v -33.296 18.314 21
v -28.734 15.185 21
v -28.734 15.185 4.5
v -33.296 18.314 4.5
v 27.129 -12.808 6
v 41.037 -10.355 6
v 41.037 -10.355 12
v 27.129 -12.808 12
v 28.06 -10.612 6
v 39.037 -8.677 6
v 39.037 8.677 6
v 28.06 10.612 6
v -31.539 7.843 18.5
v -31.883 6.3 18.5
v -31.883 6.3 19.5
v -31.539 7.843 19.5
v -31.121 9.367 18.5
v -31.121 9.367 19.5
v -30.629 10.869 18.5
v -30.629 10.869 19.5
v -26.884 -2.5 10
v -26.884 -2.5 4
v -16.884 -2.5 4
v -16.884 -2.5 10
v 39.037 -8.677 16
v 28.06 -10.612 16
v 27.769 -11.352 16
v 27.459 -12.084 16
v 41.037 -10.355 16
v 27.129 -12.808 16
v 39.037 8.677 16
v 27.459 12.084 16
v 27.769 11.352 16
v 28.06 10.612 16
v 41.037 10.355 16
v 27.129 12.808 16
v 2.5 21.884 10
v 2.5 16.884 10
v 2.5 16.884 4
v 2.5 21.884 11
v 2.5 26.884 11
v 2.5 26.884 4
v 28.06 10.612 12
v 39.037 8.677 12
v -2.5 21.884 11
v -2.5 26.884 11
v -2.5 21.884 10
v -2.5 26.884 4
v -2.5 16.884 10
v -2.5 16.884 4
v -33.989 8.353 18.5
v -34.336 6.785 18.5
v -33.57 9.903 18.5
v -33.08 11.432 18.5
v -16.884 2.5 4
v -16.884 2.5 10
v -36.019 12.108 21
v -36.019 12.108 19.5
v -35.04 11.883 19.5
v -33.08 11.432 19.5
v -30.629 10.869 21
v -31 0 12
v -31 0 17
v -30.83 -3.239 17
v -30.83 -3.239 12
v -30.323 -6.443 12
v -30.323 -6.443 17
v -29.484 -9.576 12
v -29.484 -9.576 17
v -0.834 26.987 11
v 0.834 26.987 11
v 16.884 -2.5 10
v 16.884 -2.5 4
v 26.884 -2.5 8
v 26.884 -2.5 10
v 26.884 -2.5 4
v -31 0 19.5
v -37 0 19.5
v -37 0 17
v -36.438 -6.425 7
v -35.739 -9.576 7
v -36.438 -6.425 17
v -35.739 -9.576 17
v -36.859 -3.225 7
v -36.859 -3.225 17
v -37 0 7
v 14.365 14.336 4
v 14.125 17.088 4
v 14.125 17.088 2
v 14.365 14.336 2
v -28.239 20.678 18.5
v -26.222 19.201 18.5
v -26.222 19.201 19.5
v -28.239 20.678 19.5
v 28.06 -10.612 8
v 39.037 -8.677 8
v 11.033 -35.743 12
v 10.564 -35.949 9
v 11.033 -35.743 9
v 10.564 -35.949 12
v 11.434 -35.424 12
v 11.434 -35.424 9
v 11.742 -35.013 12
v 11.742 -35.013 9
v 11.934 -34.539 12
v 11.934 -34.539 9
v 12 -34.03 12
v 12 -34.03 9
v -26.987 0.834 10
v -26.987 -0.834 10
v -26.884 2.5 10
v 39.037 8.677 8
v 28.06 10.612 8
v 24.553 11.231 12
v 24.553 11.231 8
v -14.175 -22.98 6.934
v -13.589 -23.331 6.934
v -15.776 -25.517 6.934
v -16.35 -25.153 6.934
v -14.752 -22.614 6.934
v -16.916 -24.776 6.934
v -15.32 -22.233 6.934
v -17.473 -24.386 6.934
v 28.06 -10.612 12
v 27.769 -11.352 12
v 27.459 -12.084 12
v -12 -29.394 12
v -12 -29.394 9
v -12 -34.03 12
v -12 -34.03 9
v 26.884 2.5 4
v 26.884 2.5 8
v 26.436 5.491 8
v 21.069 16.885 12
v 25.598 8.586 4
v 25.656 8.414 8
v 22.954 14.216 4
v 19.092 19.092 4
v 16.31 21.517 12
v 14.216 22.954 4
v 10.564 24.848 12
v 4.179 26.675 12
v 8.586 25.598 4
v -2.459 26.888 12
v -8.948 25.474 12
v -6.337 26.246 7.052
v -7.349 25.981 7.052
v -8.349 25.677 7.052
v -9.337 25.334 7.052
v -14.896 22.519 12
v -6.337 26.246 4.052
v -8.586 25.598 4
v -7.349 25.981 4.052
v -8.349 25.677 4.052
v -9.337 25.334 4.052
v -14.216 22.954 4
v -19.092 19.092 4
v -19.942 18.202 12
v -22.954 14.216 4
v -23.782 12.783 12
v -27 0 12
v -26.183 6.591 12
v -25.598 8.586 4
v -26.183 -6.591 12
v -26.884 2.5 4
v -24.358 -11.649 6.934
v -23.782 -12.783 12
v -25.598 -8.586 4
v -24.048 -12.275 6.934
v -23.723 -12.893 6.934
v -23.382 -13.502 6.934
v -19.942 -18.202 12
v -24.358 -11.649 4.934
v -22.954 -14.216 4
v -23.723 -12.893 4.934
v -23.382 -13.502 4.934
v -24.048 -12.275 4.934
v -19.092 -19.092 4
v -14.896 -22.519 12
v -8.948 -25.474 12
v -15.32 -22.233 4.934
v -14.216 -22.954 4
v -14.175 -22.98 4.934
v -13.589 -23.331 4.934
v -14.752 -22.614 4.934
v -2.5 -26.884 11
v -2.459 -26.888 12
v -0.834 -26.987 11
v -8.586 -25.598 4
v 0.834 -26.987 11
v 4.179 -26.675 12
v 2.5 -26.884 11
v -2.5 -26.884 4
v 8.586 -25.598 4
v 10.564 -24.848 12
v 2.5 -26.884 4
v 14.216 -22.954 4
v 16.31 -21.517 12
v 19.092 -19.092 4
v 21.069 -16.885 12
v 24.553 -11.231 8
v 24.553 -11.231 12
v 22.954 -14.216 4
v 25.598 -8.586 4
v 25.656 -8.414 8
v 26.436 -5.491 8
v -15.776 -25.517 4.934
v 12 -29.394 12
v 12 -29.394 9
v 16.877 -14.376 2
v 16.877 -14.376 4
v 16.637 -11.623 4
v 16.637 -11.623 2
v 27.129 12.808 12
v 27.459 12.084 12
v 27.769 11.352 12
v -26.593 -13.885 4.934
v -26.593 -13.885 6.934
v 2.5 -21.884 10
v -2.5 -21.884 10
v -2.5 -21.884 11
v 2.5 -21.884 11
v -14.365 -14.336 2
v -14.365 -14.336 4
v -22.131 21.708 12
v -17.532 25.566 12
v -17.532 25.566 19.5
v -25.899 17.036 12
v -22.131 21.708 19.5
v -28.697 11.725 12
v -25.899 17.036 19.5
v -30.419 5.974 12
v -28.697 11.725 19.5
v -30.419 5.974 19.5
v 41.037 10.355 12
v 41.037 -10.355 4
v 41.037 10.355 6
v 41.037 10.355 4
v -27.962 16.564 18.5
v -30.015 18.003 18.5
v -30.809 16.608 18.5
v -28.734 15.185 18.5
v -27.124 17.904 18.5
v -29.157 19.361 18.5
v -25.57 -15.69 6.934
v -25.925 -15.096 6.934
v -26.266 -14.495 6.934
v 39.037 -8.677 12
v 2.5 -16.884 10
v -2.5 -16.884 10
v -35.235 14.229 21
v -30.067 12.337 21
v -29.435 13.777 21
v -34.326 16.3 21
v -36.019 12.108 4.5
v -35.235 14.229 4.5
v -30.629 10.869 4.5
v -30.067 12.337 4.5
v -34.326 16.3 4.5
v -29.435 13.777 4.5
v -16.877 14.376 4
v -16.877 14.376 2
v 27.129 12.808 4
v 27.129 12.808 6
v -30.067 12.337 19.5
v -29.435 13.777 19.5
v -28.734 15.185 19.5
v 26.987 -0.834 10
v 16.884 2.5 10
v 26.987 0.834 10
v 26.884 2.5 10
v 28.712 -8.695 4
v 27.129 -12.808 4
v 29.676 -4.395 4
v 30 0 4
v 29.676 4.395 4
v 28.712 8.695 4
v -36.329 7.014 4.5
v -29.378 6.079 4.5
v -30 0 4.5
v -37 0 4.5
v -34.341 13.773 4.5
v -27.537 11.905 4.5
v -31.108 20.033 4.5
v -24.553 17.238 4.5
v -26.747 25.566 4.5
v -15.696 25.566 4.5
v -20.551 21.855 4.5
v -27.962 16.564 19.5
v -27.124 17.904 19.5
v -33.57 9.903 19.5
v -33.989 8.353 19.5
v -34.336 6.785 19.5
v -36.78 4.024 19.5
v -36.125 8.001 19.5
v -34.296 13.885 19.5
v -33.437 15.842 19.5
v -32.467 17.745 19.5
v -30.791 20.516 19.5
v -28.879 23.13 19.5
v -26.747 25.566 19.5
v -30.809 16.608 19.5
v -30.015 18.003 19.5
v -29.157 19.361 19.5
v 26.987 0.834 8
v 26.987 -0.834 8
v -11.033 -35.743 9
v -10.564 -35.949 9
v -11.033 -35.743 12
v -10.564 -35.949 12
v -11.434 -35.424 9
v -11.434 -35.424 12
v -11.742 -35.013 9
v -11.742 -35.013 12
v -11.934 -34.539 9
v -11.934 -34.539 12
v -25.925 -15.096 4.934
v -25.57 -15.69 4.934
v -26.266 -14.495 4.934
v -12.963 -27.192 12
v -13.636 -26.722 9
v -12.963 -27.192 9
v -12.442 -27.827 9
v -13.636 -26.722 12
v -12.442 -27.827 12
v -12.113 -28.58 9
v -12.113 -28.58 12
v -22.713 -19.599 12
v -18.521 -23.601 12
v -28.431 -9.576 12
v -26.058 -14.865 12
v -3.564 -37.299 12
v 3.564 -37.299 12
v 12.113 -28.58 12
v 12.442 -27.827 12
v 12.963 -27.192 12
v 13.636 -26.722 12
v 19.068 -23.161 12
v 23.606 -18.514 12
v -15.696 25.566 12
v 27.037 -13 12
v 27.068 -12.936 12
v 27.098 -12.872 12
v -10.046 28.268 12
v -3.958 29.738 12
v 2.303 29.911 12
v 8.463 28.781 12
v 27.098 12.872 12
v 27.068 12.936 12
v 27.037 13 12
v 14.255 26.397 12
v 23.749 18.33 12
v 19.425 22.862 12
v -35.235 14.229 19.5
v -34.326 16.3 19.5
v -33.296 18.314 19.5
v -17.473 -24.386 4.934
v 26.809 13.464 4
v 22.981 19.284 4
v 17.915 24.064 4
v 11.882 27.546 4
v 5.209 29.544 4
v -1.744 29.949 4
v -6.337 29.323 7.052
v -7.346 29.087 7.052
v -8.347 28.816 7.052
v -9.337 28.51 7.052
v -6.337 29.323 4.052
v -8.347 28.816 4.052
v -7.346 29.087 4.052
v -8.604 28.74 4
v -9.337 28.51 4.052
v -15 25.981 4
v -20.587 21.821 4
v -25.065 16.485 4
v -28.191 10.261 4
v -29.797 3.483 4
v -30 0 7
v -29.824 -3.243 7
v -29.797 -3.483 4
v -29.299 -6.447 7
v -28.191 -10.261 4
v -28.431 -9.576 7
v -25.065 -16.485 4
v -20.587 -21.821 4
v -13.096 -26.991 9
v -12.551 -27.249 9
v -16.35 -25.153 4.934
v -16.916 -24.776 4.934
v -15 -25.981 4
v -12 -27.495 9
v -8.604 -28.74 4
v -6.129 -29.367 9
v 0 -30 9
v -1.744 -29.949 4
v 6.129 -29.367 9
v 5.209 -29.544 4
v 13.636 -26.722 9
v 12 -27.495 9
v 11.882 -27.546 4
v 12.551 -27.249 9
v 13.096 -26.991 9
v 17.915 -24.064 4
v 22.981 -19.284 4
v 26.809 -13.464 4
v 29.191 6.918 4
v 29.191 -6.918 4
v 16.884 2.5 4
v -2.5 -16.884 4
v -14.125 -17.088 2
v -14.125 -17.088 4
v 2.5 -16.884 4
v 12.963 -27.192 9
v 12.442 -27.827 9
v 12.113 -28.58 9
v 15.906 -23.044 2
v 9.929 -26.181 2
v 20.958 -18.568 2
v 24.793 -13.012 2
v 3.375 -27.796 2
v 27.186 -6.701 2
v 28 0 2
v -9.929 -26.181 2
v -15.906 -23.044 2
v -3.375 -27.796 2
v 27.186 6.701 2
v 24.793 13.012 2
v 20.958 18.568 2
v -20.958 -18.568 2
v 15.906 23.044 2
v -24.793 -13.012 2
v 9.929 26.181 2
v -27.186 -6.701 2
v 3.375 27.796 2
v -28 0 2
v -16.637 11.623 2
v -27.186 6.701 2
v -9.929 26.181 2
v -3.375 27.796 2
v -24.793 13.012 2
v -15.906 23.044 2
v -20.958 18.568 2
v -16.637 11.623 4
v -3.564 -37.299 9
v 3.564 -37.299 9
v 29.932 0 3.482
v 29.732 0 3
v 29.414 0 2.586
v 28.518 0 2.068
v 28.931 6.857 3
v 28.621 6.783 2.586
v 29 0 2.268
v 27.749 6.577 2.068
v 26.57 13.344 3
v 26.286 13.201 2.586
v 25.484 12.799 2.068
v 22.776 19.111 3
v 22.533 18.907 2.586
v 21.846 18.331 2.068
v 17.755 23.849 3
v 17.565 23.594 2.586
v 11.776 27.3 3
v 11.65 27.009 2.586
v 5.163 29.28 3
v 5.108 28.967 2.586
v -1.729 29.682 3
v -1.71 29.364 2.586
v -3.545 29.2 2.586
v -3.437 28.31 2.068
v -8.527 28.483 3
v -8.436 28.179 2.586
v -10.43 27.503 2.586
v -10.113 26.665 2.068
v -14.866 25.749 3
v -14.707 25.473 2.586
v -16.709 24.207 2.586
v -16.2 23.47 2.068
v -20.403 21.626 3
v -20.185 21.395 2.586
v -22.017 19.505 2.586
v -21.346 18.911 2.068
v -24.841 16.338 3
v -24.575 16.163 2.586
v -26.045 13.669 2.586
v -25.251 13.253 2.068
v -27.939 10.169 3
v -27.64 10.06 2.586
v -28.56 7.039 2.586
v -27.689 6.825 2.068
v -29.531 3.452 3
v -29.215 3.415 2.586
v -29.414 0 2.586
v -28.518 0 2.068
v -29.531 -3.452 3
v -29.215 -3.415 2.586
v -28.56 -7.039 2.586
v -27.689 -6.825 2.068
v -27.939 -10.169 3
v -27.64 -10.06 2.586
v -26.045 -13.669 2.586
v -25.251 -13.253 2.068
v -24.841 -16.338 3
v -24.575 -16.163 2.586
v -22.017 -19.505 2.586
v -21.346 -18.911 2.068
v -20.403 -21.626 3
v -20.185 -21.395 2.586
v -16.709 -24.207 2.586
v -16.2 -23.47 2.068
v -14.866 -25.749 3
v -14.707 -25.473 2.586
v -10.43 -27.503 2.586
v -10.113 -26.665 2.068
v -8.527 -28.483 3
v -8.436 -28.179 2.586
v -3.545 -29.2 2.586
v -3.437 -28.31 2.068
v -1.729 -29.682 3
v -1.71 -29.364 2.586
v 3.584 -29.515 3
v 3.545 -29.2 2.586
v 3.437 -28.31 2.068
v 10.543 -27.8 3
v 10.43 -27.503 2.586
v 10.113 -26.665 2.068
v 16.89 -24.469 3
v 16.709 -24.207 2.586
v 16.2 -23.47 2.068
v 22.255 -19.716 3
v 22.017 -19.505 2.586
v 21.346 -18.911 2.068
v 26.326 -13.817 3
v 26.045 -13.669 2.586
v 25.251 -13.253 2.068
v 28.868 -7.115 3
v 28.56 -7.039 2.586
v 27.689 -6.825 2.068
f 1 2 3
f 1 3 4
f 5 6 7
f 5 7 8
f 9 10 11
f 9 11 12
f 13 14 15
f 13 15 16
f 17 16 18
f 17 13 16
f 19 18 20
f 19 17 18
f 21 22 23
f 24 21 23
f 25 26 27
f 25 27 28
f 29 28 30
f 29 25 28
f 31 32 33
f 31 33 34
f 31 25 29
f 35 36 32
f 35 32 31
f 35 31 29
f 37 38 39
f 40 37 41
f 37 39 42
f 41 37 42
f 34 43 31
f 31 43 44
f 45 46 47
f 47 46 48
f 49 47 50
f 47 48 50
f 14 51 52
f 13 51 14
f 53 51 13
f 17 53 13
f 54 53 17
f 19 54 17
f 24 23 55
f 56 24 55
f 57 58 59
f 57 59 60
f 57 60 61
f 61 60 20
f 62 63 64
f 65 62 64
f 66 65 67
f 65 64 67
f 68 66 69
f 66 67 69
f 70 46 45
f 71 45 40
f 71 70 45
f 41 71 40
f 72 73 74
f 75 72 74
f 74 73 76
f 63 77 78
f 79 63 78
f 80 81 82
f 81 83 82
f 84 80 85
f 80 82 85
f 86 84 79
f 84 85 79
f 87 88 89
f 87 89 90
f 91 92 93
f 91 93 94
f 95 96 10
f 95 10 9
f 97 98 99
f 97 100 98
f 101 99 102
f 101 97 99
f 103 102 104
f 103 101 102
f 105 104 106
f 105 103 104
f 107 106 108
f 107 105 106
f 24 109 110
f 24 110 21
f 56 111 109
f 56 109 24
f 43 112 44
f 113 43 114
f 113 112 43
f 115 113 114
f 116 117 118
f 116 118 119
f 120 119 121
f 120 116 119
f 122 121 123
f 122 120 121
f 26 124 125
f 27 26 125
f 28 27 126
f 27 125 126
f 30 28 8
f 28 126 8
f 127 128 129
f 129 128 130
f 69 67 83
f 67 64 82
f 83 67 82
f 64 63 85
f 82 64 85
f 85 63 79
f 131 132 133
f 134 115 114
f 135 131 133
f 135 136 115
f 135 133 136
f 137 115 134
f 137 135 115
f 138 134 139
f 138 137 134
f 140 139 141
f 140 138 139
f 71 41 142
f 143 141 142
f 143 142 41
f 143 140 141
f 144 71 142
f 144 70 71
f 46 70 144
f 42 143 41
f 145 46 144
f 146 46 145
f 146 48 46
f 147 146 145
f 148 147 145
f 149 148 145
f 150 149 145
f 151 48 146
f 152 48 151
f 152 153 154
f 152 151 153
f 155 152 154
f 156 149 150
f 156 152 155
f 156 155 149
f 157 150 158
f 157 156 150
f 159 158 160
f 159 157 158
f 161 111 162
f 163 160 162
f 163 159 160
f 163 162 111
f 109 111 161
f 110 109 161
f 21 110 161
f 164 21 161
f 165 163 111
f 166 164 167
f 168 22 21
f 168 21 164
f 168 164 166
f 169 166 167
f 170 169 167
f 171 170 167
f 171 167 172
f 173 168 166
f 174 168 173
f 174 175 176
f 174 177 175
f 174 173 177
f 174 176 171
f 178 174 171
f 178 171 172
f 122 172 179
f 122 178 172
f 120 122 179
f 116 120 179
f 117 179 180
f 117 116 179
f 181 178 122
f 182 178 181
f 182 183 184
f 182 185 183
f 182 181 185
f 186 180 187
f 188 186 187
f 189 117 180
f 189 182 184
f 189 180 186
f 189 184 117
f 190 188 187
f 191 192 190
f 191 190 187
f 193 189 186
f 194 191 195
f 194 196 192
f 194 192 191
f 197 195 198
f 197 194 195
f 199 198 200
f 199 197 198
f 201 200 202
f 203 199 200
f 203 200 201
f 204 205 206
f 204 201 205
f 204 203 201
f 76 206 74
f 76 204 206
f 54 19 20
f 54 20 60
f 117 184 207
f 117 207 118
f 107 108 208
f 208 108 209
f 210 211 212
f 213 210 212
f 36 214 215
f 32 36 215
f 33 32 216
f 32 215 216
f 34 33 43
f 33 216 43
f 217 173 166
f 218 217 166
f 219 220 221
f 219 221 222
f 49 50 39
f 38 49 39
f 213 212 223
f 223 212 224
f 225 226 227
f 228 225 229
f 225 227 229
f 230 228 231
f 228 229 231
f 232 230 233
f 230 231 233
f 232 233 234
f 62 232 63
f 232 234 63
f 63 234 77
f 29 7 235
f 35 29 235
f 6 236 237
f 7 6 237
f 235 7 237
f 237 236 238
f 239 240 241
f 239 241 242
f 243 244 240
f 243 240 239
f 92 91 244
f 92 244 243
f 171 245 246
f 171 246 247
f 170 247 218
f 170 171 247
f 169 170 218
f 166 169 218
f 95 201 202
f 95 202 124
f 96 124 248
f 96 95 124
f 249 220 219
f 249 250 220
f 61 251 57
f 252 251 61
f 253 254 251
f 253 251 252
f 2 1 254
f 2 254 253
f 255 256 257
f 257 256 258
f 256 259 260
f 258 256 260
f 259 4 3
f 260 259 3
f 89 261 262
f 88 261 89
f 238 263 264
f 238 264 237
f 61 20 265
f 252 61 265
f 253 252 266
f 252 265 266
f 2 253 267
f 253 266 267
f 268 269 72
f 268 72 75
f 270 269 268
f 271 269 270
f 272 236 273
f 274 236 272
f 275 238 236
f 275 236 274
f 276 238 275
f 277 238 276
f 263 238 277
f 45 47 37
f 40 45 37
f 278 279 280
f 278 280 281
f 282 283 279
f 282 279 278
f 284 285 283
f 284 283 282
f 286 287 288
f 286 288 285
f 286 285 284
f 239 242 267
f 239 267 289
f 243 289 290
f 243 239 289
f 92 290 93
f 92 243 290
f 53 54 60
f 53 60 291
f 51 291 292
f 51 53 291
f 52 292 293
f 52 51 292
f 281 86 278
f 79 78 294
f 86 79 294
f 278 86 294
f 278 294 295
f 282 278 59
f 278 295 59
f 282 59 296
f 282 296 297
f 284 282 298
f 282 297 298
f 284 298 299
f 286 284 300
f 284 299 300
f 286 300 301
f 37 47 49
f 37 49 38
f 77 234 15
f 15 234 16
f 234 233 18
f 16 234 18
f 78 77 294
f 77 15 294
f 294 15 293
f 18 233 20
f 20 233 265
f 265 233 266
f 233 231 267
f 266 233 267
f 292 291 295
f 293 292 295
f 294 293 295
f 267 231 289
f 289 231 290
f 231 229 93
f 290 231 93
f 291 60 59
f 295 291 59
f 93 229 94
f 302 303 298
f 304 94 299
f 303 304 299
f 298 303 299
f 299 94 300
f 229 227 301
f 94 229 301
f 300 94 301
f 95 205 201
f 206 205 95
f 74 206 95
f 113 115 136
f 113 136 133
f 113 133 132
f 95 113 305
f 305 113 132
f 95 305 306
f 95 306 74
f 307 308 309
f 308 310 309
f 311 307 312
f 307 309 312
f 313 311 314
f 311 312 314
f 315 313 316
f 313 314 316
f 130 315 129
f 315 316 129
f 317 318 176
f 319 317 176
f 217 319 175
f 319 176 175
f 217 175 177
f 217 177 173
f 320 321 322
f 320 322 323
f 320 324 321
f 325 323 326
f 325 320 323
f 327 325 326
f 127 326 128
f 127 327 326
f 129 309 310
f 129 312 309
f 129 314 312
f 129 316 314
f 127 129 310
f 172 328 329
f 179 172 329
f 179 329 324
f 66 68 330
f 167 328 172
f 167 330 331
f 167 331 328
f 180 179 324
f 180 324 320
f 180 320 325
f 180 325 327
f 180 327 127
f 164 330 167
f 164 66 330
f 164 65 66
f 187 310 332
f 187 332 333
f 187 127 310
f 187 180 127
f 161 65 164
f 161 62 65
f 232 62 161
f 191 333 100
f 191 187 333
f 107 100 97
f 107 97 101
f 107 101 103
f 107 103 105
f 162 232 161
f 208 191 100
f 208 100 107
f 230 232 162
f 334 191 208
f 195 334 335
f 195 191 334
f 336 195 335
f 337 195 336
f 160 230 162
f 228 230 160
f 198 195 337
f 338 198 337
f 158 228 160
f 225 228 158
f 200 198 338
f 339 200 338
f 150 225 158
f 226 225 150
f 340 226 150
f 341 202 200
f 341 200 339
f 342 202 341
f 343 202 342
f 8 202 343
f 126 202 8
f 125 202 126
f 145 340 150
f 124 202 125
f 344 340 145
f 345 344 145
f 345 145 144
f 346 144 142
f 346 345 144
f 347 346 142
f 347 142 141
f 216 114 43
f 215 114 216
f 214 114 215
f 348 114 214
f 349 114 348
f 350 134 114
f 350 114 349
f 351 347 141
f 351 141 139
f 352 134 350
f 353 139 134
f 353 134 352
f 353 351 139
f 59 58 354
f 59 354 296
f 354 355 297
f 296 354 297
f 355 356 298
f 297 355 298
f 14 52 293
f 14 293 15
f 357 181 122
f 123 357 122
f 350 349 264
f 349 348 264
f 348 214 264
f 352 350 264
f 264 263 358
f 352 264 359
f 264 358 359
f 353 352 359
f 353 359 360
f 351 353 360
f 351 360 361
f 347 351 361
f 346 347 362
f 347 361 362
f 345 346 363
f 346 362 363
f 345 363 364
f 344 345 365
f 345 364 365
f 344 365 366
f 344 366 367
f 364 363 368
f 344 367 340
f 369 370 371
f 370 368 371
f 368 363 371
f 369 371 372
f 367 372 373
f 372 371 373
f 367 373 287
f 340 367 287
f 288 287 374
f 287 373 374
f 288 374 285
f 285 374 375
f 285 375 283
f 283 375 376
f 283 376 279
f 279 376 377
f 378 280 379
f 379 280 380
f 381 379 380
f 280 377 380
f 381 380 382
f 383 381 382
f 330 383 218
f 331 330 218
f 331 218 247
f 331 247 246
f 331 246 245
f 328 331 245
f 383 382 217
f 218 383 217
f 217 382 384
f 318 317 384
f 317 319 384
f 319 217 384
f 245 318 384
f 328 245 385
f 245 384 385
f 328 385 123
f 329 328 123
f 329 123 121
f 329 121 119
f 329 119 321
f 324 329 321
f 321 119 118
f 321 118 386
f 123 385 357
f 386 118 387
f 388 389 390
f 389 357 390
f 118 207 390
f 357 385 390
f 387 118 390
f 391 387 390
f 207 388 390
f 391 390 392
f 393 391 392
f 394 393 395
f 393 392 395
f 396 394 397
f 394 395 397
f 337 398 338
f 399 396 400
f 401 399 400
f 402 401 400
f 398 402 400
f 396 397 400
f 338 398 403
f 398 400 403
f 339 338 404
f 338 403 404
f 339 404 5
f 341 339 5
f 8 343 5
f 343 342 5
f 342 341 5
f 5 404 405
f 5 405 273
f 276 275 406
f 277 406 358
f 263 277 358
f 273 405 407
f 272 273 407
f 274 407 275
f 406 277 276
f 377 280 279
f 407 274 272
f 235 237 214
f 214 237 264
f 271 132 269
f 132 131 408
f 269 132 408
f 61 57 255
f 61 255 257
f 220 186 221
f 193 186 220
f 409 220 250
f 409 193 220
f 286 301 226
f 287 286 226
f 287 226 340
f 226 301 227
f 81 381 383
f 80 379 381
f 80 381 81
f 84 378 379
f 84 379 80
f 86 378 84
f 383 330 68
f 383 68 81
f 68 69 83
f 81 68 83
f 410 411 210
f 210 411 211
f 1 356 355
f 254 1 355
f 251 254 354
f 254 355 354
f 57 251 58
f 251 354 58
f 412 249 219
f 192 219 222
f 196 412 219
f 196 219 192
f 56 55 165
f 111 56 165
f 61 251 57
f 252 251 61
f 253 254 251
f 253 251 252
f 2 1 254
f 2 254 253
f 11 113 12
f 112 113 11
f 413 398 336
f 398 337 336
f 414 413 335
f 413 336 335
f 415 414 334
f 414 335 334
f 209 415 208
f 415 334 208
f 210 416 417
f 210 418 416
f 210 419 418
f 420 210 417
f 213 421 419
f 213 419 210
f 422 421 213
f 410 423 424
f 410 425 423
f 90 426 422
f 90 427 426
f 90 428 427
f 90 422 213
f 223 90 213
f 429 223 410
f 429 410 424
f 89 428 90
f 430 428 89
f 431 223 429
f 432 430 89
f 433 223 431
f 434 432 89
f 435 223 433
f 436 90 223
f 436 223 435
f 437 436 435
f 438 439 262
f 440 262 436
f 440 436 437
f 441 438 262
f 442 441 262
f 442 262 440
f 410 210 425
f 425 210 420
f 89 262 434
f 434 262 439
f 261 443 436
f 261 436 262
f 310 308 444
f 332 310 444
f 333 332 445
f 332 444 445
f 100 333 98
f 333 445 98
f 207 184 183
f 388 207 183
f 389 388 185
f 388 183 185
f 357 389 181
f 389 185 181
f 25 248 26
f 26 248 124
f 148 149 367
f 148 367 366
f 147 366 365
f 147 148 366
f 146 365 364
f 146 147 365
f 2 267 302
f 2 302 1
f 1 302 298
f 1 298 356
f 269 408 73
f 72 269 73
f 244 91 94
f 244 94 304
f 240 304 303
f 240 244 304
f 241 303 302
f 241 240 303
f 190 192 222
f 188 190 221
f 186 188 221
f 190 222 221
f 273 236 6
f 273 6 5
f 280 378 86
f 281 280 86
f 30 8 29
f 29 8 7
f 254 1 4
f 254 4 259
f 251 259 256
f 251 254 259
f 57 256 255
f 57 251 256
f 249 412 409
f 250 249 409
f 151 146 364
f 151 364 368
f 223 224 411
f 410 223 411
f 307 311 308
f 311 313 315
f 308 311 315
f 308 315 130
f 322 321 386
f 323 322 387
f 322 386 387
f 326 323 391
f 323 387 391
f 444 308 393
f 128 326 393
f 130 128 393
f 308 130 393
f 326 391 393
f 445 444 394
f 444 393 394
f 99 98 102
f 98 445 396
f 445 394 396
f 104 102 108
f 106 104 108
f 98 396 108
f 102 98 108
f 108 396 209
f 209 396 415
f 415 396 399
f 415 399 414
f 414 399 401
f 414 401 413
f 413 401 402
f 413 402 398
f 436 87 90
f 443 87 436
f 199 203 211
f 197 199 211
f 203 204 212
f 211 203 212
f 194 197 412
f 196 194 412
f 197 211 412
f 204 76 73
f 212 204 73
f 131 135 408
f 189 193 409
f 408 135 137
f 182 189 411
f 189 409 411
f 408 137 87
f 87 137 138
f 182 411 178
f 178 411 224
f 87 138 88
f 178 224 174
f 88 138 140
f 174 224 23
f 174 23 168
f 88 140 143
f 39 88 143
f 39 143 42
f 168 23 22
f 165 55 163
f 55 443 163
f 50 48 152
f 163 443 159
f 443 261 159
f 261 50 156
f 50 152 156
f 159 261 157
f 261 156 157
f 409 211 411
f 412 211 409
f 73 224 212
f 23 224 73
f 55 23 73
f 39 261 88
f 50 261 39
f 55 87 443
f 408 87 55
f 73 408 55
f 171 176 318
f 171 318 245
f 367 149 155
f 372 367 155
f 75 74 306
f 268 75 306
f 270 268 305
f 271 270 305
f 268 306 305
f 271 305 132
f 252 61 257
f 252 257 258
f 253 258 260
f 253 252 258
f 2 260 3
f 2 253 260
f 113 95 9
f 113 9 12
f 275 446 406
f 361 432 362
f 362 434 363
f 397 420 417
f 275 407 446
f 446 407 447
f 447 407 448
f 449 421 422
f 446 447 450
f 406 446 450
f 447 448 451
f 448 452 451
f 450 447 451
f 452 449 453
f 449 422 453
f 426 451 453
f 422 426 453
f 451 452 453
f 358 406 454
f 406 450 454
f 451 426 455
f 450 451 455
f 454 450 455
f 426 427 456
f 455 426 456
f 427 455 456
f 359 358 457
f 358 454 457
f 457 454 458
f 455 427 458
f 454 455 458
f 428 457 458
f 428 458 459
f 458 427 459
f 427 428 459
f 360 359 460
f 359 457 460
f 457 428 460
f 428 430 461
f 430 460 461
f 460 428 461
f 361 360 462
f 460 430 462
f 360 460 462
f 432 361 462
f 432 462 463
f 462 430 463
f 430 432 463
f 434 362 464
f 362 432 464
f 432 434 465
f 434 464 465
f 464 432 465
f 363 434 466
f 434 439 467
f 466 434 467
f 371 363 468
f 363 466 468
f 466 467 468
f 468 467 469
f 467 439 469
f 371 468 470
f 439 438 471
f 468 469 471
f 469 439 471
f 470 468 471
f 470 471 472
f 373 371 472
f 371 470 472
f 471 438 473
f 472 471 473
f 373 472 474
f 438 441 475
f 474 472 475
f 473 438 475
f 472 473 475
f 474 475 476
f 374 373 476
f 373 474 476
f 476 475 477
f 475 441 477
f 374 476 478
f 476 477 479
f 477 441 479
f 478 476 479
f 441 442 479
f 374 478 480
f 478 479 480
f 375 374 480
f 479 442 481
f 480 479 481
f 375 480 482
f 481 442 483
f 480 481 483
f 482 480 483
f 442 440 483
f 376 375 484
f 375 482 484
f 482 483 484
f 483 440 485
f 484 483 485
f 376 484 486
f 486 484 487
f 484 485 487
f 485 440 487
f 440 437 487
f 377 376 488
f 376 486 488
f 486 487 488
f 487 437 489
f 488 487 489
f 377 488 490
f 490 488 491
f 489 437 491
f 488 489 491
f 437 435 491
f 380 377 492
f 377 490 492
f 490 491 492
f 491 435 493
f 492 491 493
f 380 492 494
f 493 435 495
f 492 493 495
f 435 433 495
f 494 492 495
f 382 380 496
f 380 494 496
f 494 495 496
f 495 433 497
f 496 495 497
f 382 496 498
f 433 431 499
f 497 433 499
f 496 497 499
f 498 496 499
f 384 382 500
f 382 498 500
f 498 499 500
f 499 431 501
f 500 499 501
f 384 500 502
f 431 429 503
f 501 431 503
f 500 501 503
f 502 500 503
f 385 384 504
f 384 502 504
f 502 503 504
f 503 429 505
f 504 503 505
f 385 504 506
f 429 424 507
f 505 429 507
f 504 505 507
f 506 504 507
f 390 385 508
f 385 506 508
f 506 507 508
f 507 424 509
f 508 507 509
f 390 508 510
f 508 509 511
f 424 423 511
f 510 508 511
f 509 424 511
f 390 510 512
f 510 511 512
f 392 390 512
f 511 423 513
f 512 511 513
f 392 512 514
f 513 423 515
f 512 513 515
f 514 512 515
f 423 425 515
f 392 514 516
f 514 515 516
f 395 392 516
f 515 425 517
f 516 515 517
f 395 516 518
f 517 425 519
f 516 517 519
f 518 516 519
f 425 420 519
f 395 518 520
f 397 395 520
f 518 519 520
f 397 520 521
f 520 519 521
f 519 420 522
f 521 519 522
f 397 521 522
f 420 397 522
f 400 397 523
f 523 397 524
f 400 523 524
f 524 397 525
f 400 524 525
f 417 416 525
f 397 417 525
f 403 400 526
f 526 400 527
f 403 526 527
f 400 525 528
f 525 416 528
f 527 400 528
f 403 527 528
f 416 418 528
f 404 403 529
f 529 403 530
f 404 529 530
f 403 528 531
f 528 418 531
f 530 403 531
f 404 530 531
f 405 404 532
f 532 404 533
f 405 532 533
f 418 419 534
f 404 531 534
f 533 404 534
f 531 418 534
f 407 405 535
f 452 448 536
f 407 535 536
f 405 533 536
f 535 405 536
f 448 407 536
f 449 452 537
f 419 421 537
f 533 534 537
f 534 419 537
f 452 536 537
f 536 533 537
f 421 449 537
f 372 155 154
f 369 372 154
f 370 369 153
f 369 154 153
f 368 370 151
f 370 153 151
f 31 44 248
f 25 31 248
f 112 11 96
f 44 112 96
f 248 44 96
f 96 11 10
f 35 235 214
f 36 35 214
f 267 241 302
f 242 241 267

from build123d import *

# Parameters (mm, degrees)
SKETCH_1_R           = 30
EXTRUDE_1_DEPTH      = 2
SKETCH_5_R           = 30
SKETCH_5_R_2         = 27
EXTRUDE_2_DEPTH      = 10
EXTRUDE_START        = -3
EXTRUDE_3_DEPTH      = 3
FILLET_2_R           = 3
FILLET_3_R           = 3
EXTRUDE_START_2      = -6
EXTRUDE_4_DEPTH      = 6
EXTRUDE_6_DEPTH      = 7.5
SKETCH_14_R          = 31
CUT_EXTRUDE_3_DEPTH  = 7.5
CHAMFER_4_SIZE       = 2.644904711
CHAMFER_4_SIZE_2     = 15
CHAMFER_5_SIZE       = 2.644904711
CHAMFER_5_SIZE_2     = 15
CUT_EXTRUDE_START    = -4
CUT_EXTRUDE_6_DEPTH  = 4
EXTRUDE_10_DEPTH     = 5
CUT_EXTRUDE_START_2  = 6
CUT_EXTRUDE_7_DEPTH  = 6
EXTRUDE_11_DEPTH     = 8
EXTRUDE_12_DEPTH     = 1
EXTRUDE_13_DEPTH     = 1.5
EXTRUDE_14_DEPTH     = 16.5
CUT_EXTRUDE_START_3  = -1
CUT_EXTRUDE_8_DEPTH  = 1
EXTRUDE_START_3      = 2
EXTRUDE_15_DEPTH     = 2
CUT_EXTRUDE_9_DEPTH  = 2
SKETCH_33_R          = 30
CUT_EXTRUDE_10_DEPTH = 2
SKETCH_34_R          = 30
EXTRUDE_16_DEPTH     = 2
FILLET_4_R           = 2
FILLET_5_R           = 2
CUT_EXTRUDE_11_DEPTH = 10
FILLET_6_R           = 2
SKETCH_37_W          = 2
SKETCH_37_H          = 2
CUT_EXTRUDE_12_DEPTH = 65
SKETCH_38_W          = 3
SKETCH_38_H          = 3
CUT_EXTRUDE_14_DEPTH = 45
EXTRUDE_17_DEPTH     = 4


# Some blends are built 0.0001 mm under size
with BuildPart() as part:
    # 草图1 → 凸台-拉伸1 (new body)
    with BuildSketch(Plane.XY):
        Circle(SKETCH_1_R)
    extrude(amount=EXTRUDE_1_DEPTH)

    # 草图5 → 凸台-拉伸2 (add)
    with BuildSketch(Plane.XY.offset(2)):
        Circle(SKETCH_5_R)
        Circle(SKETCH_5_R_2, mode=Mode.SUBTRACT)
    extrude(amount=EXTRUDE_2_DEPTH)

    # 草图6 → 凸台-拉伸3 (add)
    with BuildSketch(Plane.XY.offset(12).offset(EXTRUDE_START)):
        with BuildLine():
            Line((-12, -27.49545417), (-12, -35.49545417))
            ThreePointArc((-12, -35.49545417), (0, -37.469017424), (12, -35.49545417))
            Line((12, -35.49545417), (12, -27.49545417))
            ThreePointArc((12, -27.49545417), (0, -30), (-12, -27.49545417))
        make_face()
    extrude(amount=EXTRUDE_3_DEPTH)

    # 圆角2
    fillet_2_edges = [part.edges().sort_by_distance(p)[0] for p in [
        (-12, -27.49545417, 10.5),
    ]]
    fillet(fillet_2_edges, radius=FILLET_2_R)

    # 圆角3
    fillet_3_edges = [part.edges().sort_by_distance(p)[0] for p in [
        (12, -27.49545417, 10.5),
    ]]
    fillet(fillet_3_edges, radius=FILLET_3_R)

    # 草图8 → 凸台-拉伸4 (add)
    with BuildSketch(Plane.XY.offset(12).offset(EXTRUDE_START_2)):
        with BuildLine():
            Line((27.037011669, -13), (41.037011669, -13))
            Line((41.037011669, -13), (41.037011669, 13))
            Line((41.037011669, 13), (27.037011669, 13))
            ThreePointArc((27.037011669, 13), (30, 0), (27.037011669, -13))
        make_face()
    extrude(amount=EXTRUDE_4_DEPTH)

    # 草图13 → 凸台-拉伸6 (add, symmetric)
    with BuildSketch(Plane.XY.offset(12)):
        with BuildLine():
            Line((-26.746575291, 25.566006927), (-15.696473801, 25.566006927))
            ThreePointArc((-15.696473801, 25.566006927), (-26.181044804, 14.647624141), (-30, 0))
            Line((-30, 0), (-37, 0))
            ThreePointArc((-37, 0), (-34.341107188, 13.772739637), (-26.746575291, 25.566006927))
        make_face()
    extrude(amount=EXTRUDE_6_DEPTH, both=True)

    # 草图14 → 切除-拉伸3 (cut)
    with BuildSketch(Plane.XY.offset(19.5)):
        Circle(SKETCH_14_R)
    extrude(amount=-CUT_EXTRUDE_3_DEPTH, mode=Mode.SUBTRACT)

    # 倒角4
    # the kernel refuses this chamfer: 15, 2.644904711 mm, written as the material it takes off along each edge
    with BuildSketch(Plane(origin=(41.037011669, 13, -32.978081946), x_dir=(0.21013876076743002, -0.9776715712462589, 0), z_dir=(0, 0, 1))) as chamfer_4_piece_1_section:
        Polygon((CHAMFER_4_SIZE * 0.977671571108, -CHAMFER_4_SIZE * 0.210138760738), (-CHAMFER_4_SIZE_2 * 0.210138760767, -CHAMFER_4_SIZE_2 * 0.977671571246), (0, 0), align=None)
    chamfer_4_piece_1 = extrude(amount=83.956163893, mode=Mode.PRIVATE)
    chamfer_4_piece_1 = chamfer_4_piece_1 - Plane(origin=(0, 0, 9), x_dir=(1, 0, 0), z_dir=(0, 0, -1)) * Cylinder(30, 227, mode=Mode.PRIVATE)
    add(chamfer_4_piece_1, mode=Mode.SUBTRACT)

    # 倒角5
    # the kernel refuses this chamfer: 15, 2.644904711 mm, written as the material it takes off along each edge
    with BuildSketch(Plane(origin=(41.037011669, -13, -32.978081946), x_dir=(0.21013876076743015, 0.9776715712462588, 0), z_dir=(0, 0, 1))) as chamfer_5_piece_1_section:
        Polygon((CHAMFER_5_SIZE * 0.977671571108, CHAMFER_5_SIZE * 0.210138760738), (-CHAMFER_5_SIZE_2 * 0.210138760767, CHAMFER_5_SIZE_2 * 0.977671571246), (0, 0), align=None)
    chamfer_5_piece_1 = extrude(amount=83.956163893, mode=Mode.PRIVATE)
    chamfer_5_piece_1 = chamfer_5_piece_1 - Plane(origin=(0, 0, 9), x_dir=(1, 0, 0), z_dir=(0, 0, -1)) * Cylinder(30, 227, mode=Mode.PRIVATE)
    add(chamfer_5_piece_1, mode=Mode.SUBTRACT)

    # 草图16 → 切除-拉伸6 (cut)
    with BuildSketch(Plane.XY.offset(12).offset(CUT_EXTRUDE_START)):
        with BuildLine():
            ThreePointArc((27, 0), (26.381265258, 5.747072595), (24.553419007, 11.230744191))
            Line((24.553419007, 11.230744191), (18.452318659, 12.306532794))
            Line((18.452318659, 12.306532794), (21.994315515, -11.681983183))
            Line((21.994315515, -11.681983183), (24.553419007, -11.230744191))
            ThreePointArc((24.553419007, -11.230744191), (26.381265258, -5.747072595), (27, 0))
        make_face()
        with BuildLine():
            Line((18.452318659, 12.306532794), (24.553419007, 11.230744191))
            ThreePointArc((24.553419007, 11.230744191), (-27, 0), (24.553419007, -11.230744191))
            Line((24.553419007, -11.230744191), (21.994315515, -11.681983183))
            Line((21.994315515, -11.681983183), (18.452318659, 12.306532794))
        make_face()
        with BuildLine():
            Line((39.037011669, 8.676896027), (27.995789134, 10.62376146))
            Line((27.995789134, 10.62376146), (24.553419007, 11.230744191))
            ThreePointArc((24.553419007, 11.230744191), (26.381265258, 5.747072595), (27, 0))
            ThreePointArc((27, 0), (26.381265258, -5.747072595), (24.553419007, -11.230744191))
            Line((24.553419007, -11.230744191), (39.037011669, -8.676896027))
            Line((39.037011669, -8.676896027), (39.037011669, 8.676896027))
        make_face()
    extrude(amount=CUT_EXTRUDE_6_DEPTH, mode=Mode.SUBTRACT)

    # 草图17 → 凸台-拉伸10 (add, symmetric)
    with BuildSketch(Plane.XY.offset(12)):
        with BuildLine():
            Line((-28.430518618, -9.576304669), (-35.739255573, -9.576304669))
            ThreePointArc((-35.739255573, -9.576304669), (-36.683459871, -4.829469112), (-37, 0))
            Line((-37, 0), (-31, 0))
            Line((-31, 0), (-30, 0))
            ThreePointArc((-30, 0), (-29.605029628, -4.852032639), (-28.430518618, -9.576304669))
        make_face()
    extrude(amount=EXTRUDE_10_DEPTH, both=True)

    # 草图18 → 切除-拉伸7 (cut)
    with BuildSketch(Plane.XY.offset(12).offset(CUT_EXTRUDE_START_2)):
        with BuildLine():
            ThreePointArc((-31, 0), (-30.618603506, -4.847795306), (-29.483798753, -9.576304669))
            Line((-29.483798753, -9.576304669), (-28.430518618, -9.576304669))
            ThreePointArc((-28.430518618, -9.576304669), (-29.605029628, -4.852032639), (-30, 0))
            Line((-30, 0), (-31, 0))
        make_face()
    extrude(amount=-CUT_EXTRUDE_7_DEPTH, mode=Mode.SUBTRACT)

    # 草图19 → 凸台-拉伸11 (add)
    with BuildSketch(Plane.XY.offset(2)):
        with BuildLine():
            Line((-2.5, 26.884010118), (-2.5, 16.884010118))
            Line((-2.5, 16.884010118), (2.5, 16.884010118))
            Line((2.5, 16.884010118), (2.5, 26.884010118))
            ThreePointArc((2.5, 26.884010118), (0, 27), (-2.5, 26.884010118))
        make_face()
        with BuildLine():
            Line((26.884010118, 2.5), (16.884010118, 2.5))
            Line((16.884010118, 2.5), (16.884010118, -2.5))
            Line((16.884010118, -2.5), (26.884010118, -2.5))
            ThreePointArc((26.884010118, -2.5), (27, 0), (26.884010118, 2.5))
        make_face()
        with BuildLine():
            Line((2.5, -26.884010118), (2.5, -16.884010118))
            Line((2.5, -16.884010118), (-2.5, -16.884010118))
            Line((-2.5, -16.884010118), (-2.5, -26.884010118))
            ThreePointArc((-2.5, -26.884010118), (0, -27), (2.5, -26.884010118))
        make_face()
        with BuildLine():
            Line((-26.884010118, -2.5), (-16.884010118, -2.5))
            Line((-16.884010118, -2.5), (-16.884010118, 2.5))
            Line((-16.884010118, 2.5), (-26.884010118, 2.5))
            ThreePointArc((-26.884010118, 2.5), (-27, 0), (-26.884010118, -2.5))
        make_face()
    extrude(amount=EXTRUDE_11_DEPTH)

    # 草图20 → 凸台-拉伸12 (add)
    with BuildSketch(Plane.XY.offset(10)):
        with BuildLine():
            ThreePointArc((2.5, -26.884010118), (0, -27), (-2.5, -26.884010118))
            Line((-2.5, -26.884010118), (-2.5, -21.884010118))
            Line((-2.5, -21.884010118), (2.5, -21.884010118))
            Line((2.5, -21.884010118), (2.5, -26.884010118))
        make_face()
        with BuildLine():
            ThreePointArc((2.5, 26.884010118), (0, 27), (-2.5, 26.884010118))
            Line((-2.5, 26.884010118), (-2.5, 21.884010118))
            Line((-2.5, 21.884010118), (2.5, 21.884010118))
            Line((2.5, 21.884010118), (2.5, 26.884010118))
        make_face()
    extrude(amount=EXTRUDE_12_DEPTH)

    # 草图21 → 凸台-拉伸13 (add)
    with BuildSketch(Plane.XY.offset(19.5)):
        with BuildLine():
            Line((-28.734434843, 15.184935109), (-33.295866493, 18.31352709))
            ThreePointArc((-33.295866493, 18.31352709), (-34.796265088, 15.271540063), (-36.019428995, 12.10787904))
            Line((-36.019428995, 12.10787904), (-30.628781703, 10.868658214))
            ThreePointArc((-30.628781703, 10.868658214), (-29.759963562, 13.061185581), (-28.734434843, 15.184935109))
        make_face()
    extrude(amount=EXTRUDE_13_DEPTH)

    # 草图28 → 切除-拉伸8 (cut)
    with BuildSketch(Plane.XY.offset(19.5).offset(CUT_EXTRUDE_START_3)):
        with BuildLine():
            Line((-34.336052546, 6.784946244), (-31.883477364, 6.300307226))
            ThreePointArc((-31.883477364, 6.300307226), (-31.339481347, 8.60737526), (-30.628781703, 10.868658214))
            Line((-30.628781703, 10.868658214), (-33.080272788, 11.432215546))
            ThreePointArc((-33.080272788, 11.432215546), (-33.788156333, 9.130196691), (-34.336052546, 6.784946244))
        make_face()
        with BuildLine():
            ThreePointArc((-28.734434843, 15.184935109), (-27.551258788, 17.238855508), (-26.22152974, 19.201077524))
            Line((-26.22152974, 19.201077524), (-28.23857049, 20.678083487))
            ThreePointArc((-28.23857049, 20.678083487), (-29.593761465, 18.687142166), (-30.80882562, 16.607717))
            Line((-30.80882562, 16.607717), (-28.734434843, 15.184935109))
        make_face()
    extrude(amount=CUT_EXTRUDE_8_DEPTH, mode=Mode.SUBTRACT)

    # 草图31 → 凸台-拉伸15 (add)
    with BuildSketch(Plane(origin=(0, 0, 6), x_dir=(-1, 0, 0), z_dir=(0, 0, -1)).offset(EXTRUDE_START_3)):
        with BuildLine():
            Line((-41.037011669, 10.355095289), (-41.037011669, -10.355095289))
            Line((-41.037011669, -10.355095289), (-27.128728731, -12.807500827))
            ThreePointArc((-27.128728731, -12.807500827), (-30, 0), (-27.128728731, 12.807500827))
            Line((-27.128728731, 12.807500827), (-41.037011669, 10.355095289))
        make_face()
    extrude(amount=-EXTRUDE_15_DEPTH)

    # 草图32 → 切除-拉伸9 (cut)
    with BuildSketch(Plane.XY.offset(8)):
        Polygon((39.037011669, -8.676896027), (28.060239243, -10.612397167), (28.060239243, 10.612397167), (39.037011669, 8.676896027), align=None)
    extrude(amount=-CUT_EXTRUDE_9_DEPTH, mode=Mode.SUBTRACT)

    # 草图33 → 切除-拉伸10 (cut)
    with BuildSketch(Plane(origin=(0, 0, 0), x_dir=(-1, 0, 0), z_dir=(0, 0, -1))):
        Circle(SKETCH_33_R)
    extrude(amount=-CUT_EXTRUDE_10_DEPTH, mode=Mode.SUBTRACT)

    # 草图34 → 凸台-拉伸16 (add)
    with BuildSketch(Plane(origin=(0, 0, 2), x_dir=(-1, 0, 0), z_dir=(0, 0, -1))):
        Circle(SKETCH_34_R)
    extrude(amount=-EXTRUDE_16_DEPTH)

    # 圆角4
    fillet_4_edges = [part.edges().sort_by_distance(p)[0] for p in [
        (-12, -35.49545417, 10.5),
    ]]
    fillet(fillet_4_edges, radius=FILLET_4_R)

    # 圆角5
    fillet_5_edges = [part.edges().sort_by_distance(p)[0] for p in [
        (12, -35.49545417, 10.5),
    ]]
    fillet(fillet_5_edges, radius=FILLET_5_R)

    # 草图35 → 切除-拉伸11 (cut)
    with BuildSketch(Plane.XY.offset(4)):
        Polygon((-16.877298883, 14.375665163), (14.124586731, 17.087978702), (14.365382137, 14.33567462), (-16.636503477, 11.623361081), align=None)
        Polygon((16.877298883, -14.375665163), (16.636503477, -11.623361081), (-14.365382137, -14.33567462), (-14.124586731, -17.087978702), align=None)
    extrude(amount=-CUT_EXTRUDE_11_DEPTH, mode=Mode.SUBTRACT)

    # 圆角6
    fillet_6_edges = [part.edges().sort_by_distance(p)[0] for p in [
        (-30, 0, 2),
    ]]
    fillet(fillet_6_edges, radius=FILLET_6_R - 0.0001)  # a hair under: the kernel refuses the full size

    # 草图37 → 切除-拉伸12 (cut)
    with BuildSketch(Plane(origin=(7.192005059, 7.192005059, 0), x_dir=(0, 0, 1), z_dir=(-0.7071067811865475, -0.7071067811865476, 0))):
        with Locations((5.93438389, 7.985973932)):
            Rectangle(SKETCH_37_W, SKETCH_37_H)
        with Locations((5.93438389, -5.888371601)):
            Rectangle(SKETCH_37_W, SKETCH_37_H)
    extrude(amount=CUT_EXTRUDE_12_DEPTH, mode=Mode.SUBTRACT)

    # 草图38 → 切除-拉伸14 (cut)
    with BuildSketch(Plane(origin=(0, 0, 0), x_dir=(1, 0, 0), z_dir=(0, 1, 0))):
        with Locations((-7.837080141, -5.551868465)):
            Rectangle(SKETCH_38_W, SKETCH_38_H)
    extrude(amount=CUT_EXTRUDE_14_DEPTH, mode=Mode.SUBTRACT)

    # 草图40 → 凸台-拉伸17 (add)
    with BuildSketch(Plane.XY.offset(12)):
        with BuildLine():
            Line((27.128728731, -12.807500827), (41.037011669, -10.355095289))
            Line((41.037011669, -10.355095289), (41.037011669, 10.355095289))
            Line((41.037011669, 10.355095289), (27.128728731, 12.807500827))
            ThreePointArc((27.128728731, 12.807500827), (27.61630255, 11.719207886), (28.060239243, 10.612397167))
            Line((28.060239243, 10.612397167), (39.037011669, 8.676896027))
            Line((39.037011669, 8.676896027), (39.037011669, -8.676896027))
            Line((39.037011669, -8.676896027), (28.060239243, -10.612397167))
            ThreePointArc((28.060239243, -10.612397167), (27.61630255, -11.719207886), (27.128728731, -12.807500827))
        make_face()
    extrude(amount=EXTRUDE_17_DEPTH)


with BuildPart() as body_2:
    # 草图26 → 凸台-拉伸14 (new body)
    with BuildSketch(Plane.XY.offset(21)):
        with BuildLine():
            Line((-28.734434843, 15.184935109), (-33.295866493, 18.31352709))
            ThreePointArc((-33.295866493, 18.31352709), (-34.796265088, 15.271540063), (-36.019428995, 12.10787904))
            Line((-36.019428995, 12.10787904), (-30.628781703, 10.868658214))
            ThreePointArc((-30.628781703, 10.868658214), (-29.759963562, 13.061185581), (-28.734434843, 15.184935109))
        make_face()
    extrude(amount=-EXTRUDE_14_DEPTH)


solid = Compound([part.part, body_2.part])
